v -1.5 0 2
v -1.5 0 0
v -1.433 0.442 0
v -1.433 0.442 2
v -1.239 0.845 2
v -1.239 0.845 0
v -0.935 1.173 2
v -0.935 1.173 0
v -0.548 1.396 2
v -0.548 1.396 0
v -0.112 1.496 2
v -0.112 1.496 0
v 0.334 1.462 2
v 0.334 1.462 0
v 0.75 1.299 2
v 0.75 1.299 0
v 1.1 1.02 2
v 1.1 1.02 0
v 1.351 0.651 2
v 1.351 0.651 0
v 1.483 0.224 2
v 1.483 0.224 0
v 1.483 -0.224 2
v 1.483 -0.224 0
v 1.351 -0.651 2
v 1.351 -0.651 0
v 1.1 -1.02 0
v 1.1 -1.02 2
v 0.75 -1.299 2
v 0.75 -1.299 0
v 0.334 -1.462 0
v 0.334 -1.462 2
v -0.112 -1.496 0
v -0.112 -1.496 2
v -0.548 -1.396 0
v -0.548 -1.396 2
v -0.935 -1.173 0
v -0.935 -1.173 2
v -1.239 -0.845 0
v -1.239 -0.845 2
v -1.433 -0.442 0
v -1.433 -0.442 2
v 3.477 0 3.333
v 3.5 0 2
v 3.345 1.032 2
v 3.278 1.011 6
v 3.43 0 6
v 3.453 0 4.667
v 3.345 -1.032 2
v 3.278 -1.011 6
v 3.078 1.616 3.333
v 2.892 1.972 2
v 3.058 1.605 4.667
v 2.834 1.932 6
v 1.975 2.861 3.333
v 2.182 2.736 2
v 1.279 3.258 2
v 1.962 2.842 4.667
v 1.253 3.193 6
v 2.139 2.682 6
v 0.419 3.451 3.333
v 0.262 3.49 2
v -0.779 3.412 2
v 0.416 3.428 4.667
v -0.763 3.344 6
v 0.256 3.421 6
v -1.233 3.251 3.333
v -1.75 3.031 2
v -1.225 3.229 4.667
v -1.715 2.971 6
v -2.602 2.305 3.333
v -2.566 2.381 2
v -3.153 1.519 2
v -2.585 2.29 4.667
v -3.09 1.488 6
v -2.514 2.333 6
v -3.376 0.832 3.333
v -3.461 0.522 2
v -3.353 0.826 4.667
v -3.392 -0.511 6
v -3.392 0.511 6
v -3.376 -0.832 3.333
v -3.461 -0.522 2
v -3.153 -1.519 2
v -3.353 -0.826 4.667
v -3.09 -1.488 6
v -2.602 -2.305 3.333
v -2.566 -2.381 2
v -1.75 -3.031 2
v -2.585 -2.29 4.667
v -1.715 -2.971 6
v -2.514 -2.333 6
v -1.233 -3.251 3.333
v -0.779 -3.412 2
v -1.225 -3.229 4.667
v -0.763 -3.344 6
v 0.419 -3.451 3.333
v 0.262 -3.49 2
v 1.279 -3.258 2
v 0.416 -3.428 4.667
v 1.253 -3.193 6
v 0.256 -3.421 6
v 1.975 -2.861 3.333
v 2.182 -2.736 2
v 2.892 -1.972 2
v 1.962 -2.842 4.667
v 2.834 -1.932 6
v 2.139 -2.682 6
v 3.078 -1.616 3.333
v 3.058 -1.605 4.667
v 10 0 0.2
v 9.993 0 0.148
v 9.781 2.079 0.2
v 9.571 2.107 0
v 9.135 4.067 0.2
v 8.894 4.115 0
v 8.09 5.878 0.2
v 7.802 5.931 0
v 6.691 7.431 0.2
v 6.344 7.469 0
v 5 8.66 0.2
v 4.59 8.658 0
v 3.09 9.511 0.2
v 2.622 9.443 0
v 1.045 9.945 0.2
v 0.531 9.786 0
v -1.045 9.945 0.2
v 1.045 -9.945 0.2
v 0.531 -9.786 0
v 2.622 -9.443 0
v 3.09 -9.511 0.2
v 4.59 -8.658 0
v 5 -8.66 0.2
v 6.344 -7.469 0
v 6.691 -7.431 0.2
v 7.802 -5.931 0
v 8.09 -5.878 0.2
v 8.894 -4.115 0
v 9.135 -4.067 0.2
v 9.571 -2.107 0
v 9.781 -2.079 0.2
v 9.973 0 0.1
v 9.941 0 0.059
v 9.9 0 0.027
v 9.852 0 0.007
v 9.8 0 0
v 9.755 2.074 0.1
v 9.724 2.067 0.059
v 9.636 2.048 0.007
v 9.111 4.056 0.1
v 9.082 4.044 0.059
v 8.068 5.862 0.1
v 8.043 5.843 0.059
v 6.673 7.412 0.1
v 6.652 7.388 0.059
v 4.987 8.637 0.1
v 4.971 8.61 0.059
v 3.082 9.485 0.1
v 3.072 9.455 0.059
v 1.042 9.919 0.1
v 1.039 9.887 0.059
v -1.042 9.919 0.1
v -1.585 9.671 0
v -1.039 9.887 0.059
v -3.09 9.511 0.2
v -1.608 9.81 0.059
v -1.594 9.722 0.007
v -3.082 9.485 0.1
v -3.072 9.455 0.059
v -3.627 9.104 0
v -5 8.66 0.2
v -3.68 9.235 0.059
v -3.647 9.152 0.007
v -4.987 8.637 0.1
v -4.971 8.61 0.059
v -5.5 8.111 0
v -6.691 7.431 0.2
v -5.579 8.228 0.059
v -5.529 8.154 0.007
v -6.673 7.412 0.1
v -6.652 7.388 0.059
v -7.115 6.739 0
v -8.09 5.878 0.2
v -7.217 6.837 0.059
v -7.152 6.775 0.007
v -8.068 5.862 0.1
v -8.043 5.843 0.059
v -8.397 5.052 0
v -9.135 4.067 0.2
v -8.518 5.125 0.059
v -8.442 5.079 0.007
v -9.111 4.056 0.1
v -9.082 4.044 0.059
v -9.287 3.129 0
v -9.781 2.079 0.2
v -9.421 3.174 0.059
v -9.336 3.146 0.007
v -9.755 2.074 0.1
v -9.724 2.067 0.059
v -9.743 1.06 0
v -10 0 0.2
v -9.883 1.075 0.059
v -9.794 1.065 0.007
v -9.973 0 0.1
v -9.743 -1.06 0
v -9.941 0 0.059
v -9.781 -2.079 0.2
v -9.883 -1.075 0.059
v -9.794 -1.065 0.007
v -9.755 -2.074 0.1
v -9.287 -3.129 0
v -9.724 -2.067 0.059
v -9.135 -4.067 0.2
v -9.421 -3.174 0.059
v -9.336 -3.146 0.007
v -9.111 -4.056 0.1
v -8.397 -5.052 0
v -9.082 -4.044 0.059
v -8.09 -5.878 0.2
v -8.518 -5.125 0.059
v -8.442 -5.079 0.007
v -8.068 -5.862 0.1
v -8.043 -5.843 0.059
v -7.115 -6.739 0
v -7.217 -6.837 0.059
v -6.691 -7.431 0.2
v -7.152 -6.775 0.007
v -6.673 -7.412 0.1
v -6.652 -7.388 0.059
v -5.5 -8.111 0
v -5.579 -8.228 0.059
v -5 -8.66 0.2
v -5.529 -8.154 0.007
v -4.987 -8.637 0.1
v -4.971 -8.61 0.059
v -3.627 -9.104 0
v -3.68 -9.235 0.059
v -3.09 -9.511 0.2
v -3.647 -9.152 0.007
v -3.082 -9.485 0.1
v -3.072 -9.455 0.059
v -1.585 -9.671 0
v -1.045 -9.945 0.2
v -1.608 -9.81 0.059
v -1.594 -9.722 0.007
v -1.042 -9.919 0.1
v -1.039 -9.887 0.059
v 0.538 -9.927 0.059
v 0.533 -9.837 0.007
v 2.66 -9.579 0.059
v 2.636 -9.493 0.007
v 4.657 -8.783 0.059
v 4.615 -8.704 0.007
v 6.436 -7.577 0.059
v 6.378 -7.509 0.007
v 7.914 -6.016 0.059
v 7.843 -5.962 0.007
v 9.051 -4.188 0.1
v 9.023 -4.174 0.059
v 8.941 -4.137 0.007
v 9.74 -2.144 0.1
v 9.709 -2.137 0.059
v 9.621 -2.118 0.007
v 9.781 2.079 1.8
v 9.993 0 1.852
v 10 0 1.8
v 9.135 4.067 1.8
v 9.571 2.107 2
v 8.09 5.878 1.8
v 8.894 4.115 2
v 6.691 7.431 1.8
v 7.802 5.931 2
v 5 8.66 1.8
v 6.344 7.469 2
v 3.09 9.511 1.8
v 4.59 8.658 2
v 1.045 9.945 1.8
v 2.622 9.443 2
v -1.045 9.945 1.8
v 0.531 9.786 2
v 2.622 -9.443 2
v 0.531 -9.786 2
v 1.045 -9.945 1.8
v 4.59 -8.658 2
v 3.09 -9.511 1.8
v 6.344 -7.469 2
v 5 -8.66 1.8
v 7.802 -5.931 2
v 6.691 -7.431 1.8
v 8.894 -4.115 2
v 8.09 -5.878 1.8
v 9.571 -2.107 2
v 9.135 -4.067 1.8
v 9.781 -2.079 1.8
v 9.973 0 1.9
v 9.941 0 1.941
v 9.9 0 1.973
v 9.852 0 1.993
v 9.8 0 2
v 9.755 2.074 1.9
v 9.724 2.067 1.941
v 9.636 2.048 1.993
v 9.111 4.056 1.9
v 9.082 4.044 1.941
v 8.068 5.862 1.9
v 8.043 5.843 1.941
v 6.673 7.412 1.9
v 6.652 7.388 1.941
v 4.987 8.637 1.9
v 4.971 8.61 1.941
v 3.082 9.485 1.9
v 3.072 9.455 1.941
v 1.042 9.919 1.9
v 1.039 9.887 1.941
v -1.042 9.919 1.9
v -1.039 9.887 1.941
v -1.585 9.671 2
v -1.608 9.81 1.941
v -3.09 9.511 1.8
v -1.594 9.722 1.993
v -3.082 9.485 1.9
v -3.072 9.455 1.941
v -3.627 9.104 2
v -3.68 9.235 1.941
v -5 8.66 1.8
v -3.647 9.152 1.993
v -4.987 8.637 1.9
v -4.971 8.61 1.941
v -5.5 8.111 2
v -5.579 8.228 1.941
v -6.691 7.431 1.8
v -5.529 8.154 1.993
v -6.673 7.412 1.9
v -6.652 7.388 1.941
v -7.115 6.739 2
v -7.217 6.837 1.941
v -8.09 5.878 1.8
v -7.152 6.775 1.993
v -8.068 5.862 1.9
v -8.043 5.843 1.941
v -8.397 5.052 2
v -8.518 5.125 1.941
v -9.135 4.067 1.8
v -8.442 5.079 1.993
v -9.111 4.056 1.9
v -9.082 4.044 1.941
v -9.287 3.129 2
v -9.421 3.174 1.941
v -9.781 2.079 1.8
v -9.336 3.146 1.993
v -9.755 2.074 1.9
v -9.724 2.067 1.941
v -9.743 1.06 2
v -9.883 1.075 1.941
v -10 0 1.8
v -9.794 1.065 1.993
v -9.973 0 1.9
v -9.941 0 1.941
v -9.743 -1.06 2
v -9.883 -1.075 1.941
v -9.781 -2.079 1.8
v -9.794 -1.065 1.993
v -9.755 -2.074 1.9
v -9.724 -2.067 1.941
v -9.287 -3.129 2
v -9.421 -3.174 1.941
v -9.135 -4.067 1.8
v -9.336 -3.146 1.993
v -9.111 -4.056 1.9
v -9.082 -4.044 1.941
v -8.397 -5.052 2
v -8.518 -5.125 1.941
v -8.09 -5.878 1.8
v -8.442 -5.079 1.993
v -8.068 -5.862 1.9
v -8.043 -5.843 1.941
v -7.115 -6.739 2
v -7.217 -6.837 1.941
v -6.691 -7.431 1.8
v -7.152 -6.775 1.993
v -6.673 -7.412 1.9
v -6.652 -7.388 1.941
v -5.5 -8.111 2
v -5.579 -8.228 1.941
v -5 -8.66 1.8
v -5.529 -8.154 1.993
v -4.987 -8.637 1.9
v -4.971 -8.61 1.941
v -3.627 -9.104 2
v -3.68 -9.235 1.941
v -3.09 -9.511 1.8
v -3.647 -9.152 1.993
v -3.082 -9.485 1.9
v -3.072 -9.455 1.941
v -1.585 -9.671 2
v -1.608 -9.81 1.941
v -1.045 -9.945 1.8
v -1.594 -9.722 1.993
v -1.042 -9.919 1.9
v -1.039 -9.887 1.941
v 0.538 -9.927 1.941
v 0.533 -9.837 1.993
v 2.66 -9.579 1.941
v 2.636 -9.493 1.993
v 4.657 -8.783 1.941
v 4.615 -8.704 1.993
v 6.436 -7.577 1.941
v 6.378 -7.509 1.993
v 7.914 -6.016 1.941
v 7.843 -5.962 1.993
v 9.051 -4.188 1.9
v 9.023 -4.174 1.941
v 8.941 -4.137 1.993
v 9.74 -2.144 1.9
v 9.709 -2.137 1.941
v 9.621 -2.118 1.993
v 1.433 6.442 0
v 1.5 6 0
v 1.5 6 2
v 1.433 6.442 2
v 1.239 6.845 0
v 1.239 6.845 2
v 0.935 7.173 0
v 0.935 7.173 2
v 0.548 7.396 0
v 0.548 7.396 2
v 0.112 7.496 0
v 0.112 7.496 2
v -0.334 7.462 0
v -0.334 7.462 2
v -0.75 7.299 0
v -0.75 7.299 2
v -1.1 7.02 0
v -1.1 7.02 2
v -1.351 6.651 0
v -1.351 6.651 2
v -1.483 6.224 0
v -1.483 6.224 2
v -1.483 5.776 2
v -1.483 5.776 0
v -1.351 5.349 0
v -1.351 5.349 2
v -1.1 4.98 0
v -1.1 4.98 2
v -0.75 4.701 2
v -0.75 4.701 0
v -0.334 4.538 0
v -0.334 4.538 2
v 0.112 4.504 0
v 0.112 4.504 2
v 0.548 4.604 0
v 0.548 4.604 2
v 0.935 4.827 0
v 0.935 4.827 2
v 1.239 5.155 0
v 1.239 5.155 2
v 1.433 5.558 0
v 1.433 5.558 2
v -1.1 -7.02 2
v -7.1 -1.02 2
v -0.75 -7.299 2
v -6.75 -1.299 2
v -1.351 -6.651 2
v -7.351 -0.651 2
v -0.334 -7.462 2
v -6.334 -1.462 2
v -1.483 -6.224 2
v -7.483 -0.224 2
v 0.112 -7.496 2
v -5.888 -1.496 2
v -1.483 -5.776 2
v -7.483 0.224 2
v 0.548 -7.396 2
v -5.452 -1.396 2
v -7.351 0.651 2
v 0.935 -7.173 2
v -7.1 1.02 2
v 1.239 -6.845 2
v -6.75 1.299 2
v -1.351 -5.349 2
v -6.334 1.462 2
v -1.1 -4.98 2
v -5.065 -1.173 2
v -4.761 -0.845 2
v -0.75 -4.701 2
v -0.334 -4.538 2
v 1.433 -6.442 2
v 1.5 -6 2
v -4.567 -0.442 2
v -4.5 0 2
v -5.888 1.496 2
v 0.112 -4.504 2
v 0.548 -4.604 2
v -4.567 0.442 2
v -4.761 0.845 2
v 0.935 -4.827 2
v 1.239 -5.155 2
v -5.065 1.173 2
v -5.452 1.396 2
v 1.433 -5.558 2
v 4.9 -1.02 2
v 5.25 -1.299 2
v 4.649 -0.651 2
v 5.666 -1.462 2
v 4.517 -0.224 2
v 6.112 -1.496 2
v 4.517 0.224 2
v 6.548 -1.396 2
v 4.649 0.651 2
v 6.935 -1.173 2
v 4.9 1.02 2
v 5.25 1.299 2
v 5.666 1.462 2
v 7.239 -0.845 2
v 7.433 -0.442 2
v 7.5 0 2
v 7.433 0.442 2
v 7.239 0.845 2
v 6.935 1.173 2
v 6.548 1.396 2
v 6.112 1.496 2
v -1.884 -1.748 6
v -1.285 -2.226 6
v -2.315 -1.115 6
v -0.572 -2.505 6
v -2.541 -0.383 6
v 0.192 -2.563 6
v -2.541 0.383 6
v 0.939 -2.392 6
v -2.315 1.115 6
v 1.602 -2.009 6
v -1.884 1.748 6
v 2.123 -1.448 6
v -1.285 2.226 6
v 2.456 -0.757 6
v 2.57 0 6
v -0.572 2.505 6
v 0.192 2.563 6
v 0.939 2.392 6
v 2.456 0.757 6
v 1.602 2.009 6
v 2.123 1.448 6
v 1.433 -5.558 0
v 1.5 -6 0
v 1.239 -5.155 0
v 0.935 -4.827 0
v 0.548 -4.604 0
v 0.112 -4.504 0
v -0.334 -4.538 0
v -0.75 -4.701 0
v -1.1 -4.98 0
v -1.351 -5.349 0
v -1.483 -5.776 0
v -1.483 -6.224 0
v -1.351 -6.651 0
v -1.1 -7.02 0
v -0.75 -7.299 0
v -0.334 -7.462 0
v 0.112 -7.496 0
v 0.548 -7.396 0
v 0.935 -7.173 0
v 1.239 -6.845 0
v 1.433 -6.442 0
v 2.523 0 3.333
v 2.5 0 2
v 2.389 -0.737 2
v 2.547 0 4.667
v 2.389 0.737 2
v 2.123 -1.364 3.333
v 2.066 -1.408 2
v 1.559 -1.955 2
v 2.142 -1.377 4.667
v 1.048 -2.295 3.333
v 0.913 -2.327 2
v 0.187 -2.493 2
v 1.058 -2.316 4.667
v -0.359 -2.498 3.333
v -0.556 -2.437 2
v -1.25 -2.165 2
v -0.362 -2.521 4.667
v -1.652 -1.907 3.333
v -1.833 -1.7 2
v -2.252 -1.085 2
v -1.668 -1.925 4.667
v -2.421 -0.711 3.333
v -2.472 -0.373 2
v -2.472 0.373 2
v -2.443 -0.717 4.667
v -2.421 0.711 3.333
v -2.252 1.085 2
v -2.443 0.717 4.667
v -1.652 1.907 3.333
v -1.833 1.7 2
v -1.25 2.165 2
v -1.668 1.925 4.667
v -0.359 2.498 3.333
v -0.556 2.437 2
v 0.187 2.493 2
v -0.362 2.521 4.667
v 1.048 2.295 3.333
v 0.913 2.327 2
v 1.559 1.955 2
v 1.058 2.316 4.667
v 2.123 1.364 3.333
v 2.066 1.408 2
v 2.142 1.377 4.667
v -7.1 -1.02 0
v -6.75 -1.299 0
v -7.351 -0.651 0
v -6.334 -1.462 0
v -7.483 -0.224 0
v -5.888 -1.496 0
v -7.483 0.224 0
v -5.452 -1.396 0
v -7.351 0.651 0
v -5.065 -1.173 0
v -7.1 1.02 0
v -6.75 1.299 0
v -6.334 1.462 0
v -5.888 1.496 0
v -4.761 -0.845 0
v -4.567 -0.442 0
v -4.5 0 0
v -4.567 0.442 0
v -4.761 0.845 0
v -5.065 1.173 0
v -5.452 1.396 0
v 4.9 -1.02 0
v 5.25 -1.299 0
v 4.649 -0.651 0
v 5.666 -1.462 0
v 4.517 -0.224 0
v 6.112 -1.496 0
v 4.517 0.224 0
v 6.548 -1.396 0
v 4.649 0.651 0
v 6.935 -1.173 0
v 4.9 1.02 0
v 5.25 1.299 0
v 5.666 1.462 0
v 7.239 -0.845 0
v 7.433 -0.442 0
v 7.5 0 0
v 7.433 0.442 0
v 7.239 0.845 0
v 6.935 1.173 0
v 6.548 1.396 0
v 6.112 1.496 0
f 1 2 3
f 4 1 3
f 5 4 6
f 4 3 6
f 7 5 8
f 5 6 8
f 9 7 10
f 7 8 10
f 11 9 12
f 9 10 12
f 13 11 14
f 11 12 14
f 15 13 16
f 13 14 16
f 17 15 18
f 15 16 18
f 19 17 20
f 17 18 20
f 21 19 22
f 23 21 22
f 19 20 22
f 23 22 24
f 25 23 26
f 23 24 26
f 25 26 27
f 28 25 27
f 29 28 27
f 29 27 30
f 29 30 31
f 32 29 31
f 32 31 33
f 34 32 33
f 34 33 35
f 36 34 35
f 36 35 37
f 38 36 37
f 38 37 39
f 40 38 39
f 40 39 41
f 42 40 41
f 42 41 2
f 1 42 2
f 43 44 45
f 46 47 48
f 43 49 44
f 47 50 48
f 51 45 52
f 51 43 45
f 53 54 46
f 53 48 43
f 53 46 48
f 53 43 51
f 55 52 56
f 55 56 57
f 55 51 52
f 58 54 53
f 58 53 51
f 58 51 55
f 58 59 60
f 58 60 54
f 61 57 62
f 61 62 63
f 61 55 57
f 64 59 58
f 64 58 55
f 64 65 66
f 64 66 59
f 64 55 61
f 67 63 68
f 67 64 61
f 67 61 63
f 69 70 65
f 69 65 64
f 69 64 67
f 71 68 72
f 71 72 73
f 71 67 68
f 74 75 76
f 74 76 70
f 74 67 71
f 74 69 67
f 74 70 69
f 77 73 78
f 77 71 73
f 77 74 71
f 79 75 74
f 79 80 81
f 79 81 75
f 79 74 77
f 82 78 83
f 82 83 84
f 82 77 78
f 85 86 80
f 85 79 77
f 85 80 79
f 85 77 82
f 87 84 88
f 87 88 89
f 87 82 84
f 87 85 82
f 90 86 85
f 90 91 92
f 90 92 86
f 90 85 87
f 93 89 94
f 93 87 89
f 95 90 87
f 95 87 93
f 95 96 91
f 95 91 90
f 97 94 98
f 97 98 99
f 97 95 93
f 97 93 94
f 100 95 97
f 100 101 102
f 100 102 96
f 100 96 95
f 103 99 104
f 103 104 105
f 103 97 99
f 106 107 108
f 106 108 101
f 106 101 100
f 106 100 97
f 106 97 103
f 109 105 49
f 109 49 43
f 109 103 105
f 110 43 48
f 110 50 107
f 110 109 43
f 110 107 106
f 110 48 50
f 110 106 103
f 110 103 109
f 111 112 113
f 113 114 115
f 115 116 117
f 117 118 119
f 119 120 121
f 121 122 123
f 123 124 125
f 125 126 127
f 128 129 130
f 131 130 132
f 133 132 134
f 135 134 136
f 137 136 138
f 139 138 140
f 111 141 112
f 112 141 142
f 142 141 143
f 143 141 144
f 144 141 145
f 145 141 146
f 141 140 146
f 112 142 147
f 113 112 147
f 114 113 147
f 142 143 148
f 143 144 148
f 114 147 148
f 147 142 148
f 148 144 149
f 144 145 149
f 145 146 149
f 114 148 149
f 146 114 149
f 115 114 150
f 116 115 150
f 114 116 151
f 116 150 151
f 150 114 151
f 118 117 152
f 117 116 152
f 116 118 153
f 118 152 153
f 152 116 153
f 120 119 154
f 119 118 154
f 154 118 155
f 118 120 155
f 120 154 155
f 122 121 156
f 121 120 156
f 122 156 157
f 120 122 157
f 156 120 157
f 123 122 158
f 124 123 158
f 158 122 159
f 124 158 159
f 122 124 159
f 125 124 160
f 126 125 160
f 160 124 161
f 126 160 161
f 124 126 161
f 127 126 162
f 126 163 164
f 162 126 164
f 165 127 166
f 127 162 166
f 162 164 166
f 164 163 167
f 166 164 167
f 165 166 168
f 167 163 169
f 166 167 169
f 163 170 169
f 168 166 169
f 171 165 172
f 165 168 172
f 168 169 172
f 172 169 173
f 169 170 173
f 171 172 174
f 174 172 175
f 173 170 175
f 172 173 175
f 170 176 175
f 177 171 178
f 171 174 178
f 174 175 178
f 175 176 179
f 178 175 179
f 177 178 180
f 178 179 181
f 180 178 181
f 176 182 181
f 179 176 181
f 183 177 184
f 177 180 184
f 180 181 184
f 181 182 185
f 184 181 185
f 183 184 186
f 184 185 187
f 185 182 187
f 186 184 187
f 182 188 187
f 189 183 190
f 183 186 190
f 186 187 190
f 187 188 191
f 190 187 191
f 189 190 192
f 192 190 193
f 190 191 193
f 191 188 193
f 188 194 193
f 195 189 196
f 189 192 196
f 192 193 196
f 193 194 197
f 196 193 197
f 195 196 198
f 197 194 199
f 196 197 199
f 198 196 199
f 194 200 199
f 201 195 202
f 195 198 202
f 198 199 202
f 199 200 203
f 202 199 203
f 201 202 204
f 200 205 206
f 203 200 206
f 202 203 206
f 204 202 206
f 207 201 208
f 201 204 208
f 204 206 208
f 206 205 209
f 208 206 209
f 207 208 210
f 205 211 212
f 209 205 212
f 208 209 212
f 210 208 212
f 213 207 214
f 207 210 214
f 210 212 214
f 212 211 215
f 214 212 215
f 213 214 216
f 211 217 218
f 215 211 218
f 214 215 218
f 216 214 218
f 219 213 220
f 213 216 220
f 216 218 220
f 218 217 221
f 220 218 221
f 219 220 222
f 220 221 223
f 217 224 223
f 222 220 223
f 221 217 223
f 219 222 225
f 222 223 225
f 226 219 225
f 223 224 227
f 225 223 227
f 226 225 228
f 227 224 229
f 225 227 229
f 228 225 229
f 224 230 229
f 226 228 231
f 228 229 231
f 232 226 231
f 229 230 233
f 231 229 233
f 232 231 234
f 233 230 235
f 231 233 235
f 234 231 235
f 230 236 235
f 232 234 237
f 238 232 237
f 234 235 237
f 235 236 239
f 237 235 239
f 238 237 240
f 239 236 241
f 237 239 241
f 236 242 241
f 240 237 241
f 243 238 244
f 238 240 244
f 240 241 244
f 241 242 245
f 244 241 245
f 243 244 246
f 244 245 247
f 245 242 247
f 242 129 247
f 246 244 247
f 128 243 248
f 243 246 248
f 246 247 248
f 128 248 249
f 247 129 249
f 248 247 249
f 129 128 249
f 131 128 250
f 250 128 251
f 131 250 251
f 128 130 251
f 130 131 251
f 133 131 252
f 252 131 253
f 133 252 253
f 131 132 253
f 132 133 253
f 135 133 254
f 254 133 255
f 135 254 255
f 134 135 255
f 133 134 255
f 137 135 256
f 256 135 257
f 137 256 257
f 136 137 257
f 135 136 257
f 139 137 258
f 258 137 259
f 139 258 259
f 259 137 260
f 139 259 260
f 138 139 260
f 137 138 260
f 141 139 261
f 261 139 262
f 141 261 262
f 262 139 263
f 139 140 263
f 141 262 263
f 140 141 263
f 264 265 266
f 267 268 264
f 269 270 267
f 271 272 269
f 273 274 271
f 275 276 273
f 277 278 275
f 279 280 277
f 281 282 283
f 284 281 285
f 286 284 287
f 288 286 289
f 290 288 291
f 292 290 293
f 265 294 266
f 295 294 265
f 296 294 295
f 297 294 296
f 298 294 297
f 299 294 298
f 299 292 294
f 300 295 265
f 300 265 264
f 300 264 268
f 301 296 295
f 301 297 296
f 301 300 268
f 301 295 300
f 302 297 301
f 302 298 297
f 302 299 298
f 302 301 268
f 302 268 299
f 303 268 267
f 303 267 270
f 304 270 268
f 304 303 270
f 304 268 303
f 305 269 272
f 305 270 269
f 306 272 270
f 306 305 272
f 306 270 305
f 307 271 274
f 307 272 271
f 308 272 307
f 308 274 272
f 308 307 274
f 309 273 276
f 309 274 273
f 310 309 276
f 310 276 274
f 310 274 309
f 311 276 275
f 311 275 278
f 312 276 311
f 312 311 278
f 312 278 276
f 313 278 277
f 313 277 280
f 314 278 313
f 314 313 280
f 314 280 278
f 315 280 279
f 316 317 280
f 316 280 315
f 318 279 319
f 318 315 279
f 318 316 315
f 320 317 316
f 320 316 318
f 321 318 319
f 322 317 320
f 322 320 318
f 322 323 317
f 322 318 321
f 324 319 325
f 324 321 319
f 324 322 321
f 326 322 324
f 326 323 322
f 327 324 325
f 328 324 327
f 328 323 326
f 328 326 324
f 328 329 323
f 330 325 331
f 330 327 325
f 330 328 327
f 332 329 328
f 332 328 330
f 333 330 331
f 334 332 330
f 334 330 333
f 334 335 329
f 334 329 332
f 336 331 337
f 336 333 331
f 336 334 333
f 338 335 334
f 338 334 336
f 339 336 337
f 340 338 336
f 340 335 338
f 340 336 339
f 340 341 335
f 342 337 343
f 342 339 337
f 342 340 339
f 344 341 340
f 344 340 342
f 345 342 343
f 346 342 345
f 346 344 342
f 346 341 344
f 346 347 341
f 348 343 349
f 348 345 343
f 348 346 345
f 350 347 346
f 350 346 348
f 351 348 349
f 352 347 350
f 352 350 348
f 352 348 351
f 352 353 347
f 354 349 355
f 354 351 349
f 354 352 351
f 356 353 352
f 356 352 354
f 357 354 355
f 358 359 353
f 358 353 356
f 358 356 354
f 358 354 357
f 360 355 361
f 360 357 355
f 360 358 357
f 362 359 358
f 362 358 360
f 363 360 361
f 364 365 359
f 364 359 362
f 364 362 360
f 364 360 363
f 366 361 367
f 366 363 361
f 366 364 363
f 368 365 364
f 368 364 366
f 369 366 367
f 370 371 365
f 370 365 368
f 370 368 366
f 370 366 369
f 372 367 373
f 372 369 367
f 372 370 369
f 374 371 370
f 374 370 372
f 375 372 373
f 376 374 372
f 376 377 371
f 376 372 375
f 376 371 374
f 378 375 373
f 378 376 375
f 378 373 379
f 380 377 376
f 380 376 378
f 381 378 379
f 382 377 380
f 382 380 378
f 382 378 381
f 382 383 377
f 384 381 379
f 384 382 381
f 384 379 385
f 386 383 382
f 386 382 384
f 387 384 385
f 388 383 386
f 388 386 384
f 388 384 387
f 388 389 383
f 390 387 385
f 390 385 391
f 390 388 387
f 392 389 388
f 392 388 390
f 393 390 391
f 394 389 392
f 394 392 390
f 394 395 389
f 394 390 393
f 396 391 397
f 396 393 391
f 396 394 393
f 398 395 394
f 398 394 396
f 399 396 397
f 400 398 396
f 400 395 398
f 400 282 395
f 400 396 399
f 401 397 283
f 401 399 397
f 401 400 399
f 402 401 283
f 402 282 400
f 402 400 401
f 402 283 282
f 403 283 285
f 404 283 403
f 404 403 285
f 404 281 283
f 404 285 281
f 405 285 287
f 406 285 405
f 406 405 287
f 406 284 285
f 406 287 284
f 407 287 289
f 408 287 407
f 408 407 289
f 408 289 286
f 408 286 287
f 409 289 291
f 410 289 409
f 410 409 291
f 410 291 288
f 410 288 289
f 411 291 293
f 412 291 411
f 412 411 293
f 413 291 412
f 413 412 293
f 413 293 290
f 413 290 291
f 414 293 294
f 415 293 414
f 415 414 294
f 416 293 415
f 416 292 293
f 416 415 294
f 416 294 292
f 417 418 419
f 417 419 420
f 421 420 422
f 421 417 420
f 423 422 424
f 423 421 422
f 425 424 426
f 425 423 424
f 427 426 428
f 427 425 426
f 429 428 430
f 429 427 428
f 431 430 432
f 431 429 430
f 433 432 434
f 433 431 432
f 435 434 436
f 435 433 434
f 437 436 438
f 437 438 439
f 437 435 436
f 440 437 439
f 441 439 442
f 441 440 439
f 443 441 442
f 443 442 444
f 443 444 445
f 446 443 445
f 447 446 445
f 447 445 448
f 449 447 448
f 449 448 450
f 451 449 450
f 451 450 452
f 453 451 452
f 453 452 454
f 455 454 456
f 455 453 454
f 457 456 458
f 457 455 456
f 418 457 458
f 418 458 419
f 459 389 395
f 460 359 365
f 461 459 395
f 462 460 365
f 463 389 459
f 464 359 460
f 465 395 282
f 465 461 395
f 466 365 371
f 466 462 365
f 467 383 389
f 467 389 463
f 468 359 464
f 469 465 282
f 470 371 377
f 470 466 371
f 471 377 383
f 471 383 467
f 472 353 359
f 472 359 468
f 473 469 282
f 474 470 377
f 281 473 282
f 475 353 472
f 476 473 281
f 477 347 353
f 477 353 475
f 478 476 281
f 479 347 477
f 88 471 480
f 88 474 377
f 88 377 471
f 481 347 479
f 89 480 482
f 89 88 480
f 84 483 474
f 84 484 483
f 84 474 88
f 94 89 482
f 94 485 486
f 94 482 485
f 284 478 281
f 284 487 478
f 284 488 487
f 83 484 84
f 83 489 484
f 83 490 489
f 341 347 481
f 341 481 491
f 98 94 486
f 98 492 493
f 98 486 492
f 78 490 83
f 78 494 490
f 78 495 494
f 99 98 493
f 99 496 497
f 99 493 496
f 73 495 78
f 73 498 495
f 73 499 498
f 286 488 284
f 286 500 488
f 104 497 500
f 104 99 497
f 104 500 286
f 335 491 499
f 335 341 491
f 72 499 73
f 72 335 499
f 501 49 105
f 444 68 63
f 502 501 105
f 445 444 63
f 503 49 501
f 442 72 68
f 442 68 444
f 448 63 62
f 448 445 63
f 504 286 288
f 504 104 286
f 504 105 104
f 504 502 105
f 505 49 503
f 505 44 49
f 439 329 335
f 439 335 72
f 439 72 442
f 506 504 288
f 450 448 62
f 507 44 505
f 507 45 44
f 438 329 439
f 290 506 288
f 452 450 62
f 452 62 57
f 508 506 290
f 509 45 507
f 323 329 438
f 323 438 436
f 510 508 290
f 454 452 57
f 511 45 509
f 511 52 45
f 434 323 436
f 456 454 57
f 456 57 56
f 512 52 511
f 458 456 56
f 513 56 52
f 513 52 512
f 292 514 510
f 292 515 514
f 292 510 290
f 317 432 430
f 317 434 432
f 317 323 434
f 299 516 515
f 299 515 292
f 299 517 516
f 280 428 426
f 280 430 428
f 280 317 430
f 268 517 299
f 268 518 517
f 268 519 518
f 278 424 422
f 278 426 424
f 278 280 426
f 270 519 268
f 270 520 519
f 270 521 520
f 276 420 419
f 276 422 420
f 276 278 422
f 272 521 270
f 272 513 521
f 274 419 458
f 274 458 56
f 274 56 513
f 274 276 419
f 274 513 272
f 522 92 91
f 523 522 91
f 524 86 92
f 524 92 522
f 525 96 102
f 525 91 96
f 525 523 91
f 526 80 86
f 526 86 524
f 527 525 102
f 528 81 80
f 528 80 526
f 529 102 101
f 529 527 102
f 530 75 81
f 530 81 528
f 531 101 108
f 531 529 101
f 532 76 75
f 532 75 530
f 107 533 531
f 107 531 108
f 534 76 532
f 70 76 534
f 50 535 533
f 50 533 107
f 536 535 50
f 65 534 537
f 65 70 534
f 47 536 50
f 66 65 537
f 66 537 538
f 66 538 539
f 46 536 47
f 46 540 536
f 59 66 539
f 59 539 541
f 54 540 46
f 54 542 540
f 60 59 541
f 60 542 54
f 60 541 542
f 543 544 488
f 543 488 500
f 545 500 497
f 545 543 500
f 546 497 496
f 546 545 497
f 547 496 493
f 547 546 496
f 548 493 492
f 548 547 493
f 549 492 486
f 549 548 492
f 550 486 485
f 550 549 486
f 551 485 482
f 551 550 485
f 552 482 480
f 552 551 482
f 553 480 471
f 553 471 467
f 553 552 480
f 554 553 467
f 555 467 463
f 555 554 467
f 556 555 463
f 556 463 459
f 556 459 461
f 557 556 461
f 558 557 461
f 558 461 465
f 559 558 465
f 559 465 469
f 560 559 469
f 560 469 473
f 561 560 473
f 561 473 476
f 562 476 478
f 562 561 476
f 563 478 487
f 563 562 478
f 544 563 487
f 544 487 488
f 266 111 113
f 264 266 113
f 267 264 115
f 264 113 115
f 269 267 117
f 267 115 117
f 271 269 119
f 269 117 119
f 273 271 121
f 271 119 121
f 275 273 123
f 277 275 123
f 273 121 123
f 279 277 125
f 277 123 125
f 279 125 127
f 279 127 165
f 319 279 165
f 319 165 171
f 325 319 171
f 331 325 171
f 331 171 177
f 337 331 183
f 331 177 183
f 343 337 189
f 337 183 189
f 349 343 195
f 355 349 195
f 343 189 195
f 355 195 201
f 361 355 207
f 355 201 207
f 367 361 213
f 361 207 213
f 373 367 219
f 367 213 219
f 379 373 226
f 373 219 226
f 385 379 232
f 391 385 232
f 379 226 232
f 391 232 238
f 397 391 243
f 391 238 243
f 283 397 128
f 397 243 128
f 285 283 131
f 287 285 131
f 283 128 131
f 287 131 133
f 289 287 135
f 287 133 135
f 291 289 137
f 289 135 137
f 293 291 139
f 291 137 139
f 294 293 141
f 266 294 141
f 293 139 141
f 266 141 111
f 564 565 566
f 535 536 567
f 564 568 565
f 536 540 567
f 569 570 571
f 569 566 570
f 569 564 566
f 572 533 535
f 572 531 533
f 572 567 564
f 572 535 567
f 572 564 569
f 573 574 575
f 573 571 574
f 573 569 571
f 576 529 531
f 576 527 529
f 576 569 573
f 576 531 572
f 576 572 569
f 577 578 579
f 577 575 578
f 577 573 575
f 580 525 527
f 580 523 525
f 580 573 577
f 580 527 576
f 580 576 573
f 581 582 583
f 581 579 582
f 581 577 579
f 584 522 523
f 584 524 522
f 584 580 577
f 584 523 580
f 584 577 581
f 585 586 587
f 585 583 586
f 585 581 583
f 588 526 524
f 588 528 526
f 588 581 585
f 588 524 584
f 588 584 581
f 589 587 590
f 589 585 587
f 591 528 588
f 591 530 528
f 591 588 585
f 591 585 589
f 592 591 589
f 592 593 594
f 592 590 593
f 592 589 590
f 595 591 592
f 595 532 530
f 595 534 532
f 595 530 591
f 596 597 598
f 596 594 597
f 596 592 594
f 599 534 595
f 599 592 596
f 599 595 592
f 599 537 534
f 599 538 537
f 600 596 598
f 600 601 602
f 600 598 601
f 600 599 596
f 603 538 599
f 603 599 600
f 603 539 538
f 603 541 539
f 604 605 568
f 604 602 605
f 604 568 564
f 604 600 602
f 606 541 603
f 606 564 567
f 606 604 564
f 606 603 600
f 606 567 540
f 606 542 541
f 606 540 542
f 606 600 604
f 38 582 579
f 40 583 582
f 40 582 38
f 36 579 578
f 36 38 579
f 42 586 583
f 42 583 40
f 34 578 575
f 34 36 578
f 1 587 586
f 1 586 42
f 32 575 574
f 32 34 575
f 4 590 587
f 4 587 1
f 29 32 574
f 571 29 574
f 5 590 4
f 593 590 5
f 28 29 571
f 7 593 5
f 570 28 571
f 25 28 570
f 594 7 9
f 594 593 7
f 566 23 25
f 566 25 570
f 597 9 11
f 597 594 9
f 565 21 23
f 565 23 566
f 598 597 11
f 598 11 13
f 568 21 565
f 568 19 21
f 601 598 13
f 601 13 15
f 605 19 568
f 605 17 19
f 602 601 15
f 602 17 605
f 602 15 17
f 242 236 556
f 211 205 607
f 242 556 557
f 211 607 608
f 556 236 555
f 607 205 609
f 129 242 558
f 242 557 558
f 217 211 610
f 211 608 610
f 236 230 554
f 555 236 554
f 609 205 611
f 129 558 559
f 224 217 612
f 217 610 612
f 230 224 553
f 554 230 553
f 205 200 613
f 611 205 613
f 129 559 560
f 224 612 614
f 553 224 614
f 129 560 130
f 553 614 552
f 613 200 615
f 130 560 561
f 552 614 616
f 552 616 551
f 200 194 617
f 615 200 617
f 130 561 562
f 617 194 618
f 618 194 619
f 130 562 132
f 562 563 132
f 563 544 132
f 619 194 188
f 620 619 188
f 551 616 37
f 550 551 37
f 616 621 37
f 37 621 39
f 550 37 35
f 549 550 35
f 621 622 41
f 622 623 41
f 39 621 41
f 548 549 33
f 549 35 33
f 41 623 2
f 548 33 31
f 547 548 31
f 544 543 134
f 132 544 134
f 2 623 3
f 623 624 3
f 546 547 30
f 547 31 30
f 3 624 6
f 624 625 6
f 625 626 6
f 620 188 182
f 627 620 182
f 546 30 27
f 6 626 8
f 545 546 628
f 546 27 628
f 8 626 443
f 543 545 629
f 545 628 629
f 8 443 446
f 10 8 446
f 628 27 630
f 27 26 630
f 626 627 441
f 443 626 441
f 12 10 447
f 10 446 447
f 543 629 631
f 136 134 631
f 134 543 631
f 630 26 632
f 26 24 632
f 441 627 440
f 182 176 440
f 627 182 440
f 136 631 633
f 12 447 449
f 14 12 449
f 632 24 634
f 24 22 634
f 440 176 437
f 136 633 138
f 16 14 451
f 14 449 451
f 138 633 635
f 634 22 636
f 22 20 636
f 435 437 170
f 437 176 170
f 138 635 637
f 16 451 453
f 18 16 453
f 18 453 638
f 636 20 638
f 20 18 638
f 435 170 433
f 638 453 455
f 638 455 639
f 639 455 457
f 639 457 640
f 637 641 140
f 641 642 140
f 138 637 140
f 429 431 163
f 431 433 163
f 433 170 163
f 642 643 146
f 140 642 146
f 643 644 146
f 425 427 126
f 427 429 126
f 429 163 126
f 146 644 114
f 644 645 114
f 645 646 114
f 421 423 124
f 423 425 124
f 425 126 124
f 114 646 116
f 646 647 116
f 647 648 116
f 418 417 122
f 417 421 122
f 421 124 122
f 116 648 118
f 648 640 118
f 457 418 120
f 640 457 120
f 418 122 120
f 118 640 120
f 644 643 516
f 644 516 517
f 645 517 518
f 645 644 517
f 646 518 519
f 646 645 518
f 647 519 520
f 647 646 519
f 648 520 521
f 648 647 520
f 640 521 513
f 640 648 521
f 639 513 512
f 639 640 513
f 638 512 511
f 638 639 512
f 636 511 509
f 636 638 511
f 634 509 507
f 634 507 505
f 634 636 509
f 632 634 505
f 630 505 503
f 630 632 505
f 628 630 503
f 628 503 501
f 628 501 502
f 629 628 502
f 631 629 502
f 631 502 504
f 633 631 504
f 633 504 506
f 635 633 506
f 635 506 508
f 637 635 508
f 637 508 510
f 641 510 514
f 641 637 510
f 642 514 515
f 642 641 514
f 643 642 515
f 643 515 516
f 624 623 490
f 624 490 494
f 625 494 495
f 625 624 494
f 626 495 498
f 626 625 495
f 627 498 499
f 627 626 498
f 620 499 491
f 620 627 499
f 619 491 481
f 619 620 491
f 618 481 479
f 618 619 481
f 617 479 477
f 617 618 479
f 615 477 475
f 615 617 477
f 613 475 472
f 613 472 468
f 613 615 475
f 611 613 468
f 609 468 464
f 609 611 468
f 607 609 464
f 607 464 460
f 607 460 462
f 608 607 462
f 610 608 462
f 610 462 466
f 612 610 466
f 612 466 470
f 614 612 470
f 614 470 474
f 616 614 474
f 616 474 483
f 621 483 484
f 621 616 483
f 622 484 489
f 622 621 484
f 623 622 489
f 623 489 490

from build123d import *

# Parameters (mm, degrees)
IZIM1_R                     = 10
IZIM1_R_2                   = 1.5
Y_KSEKLIK_EKSTR_ZYON1_DEPTH = 2
RADYUS1_R                   = 0.2
IZIM2_R                     = 3.5
IZIM2_R_2                   = 2.5
Y_KSEKLIK_EKSTR_ZYON2_DEPTH = 4
Y_KSEKLIK_EKSTR_ZYON2_TAPER = 1
IZIM3_R                     = 1.5
KES_EKSTR_ZYON1_DEPTH       = 4


with BuildPart() as part:
    # Çizim1 → Yükseklik-Ekstrüzyon1 (new body)
    with BuildSketch(Plane.XY):
        Circle(IZIM1_R)
        with Locations((0, 6)):
            Circle(IZIM1_R_2, mode=Mode.SUBTRACT)
        with Locations((6, 0)):
            Circle(IZIM1_R_2, mode=Mode.SUBTRACT)
        with Locations((0, -6)):
            Circle(IZIM1_R_2, mode=Mode.SUBTRACT)
        with Locations((-6, 0)):
            Circle(IZIM1_R_2, mode=Mode.SUBTRACT)
    extrude(amount=Y_KSEKLIK_EKSTR_ZYON1_DEPTH)

    # Radyus1
    radyus1_edges = [part.edges().sort_by_distance(p)[0] for p in [
        (-10, 0, 0),
        (-10, 0, 2),
    ]]
    fillet(radyus1_edges, radius=RADYUS1_R)

    # Çizim2 → Yükseklik-Ekstrüzyon2 (add)
    with BuildSketch(Plane.XY.offset(2)):
        Circle(IZIM2_R)
        Circle(IZIM2_R_2, mode=Mode.SUBTRACT)
    extrude(amount=Y_KSEKLIK_EKSTR_ZYON2_DEPTH, taper=Y_KSEKLIK_EKSTR_ZYON2_TAPER)

    # Çizim3 → Kes-Ekstrüzyon1 (cut)
    with BuildSketch(Plane(origin=(0, 0, 0), x_dir=(-1, 0, 0), z_dir=(0, 0, -1))):
        Circle(IZIM3_R)
    extrude(amount=-KES_EKSTR_ZYON1_DEPTH, mode=Mode.SUBTRACT)


solid = part.part
